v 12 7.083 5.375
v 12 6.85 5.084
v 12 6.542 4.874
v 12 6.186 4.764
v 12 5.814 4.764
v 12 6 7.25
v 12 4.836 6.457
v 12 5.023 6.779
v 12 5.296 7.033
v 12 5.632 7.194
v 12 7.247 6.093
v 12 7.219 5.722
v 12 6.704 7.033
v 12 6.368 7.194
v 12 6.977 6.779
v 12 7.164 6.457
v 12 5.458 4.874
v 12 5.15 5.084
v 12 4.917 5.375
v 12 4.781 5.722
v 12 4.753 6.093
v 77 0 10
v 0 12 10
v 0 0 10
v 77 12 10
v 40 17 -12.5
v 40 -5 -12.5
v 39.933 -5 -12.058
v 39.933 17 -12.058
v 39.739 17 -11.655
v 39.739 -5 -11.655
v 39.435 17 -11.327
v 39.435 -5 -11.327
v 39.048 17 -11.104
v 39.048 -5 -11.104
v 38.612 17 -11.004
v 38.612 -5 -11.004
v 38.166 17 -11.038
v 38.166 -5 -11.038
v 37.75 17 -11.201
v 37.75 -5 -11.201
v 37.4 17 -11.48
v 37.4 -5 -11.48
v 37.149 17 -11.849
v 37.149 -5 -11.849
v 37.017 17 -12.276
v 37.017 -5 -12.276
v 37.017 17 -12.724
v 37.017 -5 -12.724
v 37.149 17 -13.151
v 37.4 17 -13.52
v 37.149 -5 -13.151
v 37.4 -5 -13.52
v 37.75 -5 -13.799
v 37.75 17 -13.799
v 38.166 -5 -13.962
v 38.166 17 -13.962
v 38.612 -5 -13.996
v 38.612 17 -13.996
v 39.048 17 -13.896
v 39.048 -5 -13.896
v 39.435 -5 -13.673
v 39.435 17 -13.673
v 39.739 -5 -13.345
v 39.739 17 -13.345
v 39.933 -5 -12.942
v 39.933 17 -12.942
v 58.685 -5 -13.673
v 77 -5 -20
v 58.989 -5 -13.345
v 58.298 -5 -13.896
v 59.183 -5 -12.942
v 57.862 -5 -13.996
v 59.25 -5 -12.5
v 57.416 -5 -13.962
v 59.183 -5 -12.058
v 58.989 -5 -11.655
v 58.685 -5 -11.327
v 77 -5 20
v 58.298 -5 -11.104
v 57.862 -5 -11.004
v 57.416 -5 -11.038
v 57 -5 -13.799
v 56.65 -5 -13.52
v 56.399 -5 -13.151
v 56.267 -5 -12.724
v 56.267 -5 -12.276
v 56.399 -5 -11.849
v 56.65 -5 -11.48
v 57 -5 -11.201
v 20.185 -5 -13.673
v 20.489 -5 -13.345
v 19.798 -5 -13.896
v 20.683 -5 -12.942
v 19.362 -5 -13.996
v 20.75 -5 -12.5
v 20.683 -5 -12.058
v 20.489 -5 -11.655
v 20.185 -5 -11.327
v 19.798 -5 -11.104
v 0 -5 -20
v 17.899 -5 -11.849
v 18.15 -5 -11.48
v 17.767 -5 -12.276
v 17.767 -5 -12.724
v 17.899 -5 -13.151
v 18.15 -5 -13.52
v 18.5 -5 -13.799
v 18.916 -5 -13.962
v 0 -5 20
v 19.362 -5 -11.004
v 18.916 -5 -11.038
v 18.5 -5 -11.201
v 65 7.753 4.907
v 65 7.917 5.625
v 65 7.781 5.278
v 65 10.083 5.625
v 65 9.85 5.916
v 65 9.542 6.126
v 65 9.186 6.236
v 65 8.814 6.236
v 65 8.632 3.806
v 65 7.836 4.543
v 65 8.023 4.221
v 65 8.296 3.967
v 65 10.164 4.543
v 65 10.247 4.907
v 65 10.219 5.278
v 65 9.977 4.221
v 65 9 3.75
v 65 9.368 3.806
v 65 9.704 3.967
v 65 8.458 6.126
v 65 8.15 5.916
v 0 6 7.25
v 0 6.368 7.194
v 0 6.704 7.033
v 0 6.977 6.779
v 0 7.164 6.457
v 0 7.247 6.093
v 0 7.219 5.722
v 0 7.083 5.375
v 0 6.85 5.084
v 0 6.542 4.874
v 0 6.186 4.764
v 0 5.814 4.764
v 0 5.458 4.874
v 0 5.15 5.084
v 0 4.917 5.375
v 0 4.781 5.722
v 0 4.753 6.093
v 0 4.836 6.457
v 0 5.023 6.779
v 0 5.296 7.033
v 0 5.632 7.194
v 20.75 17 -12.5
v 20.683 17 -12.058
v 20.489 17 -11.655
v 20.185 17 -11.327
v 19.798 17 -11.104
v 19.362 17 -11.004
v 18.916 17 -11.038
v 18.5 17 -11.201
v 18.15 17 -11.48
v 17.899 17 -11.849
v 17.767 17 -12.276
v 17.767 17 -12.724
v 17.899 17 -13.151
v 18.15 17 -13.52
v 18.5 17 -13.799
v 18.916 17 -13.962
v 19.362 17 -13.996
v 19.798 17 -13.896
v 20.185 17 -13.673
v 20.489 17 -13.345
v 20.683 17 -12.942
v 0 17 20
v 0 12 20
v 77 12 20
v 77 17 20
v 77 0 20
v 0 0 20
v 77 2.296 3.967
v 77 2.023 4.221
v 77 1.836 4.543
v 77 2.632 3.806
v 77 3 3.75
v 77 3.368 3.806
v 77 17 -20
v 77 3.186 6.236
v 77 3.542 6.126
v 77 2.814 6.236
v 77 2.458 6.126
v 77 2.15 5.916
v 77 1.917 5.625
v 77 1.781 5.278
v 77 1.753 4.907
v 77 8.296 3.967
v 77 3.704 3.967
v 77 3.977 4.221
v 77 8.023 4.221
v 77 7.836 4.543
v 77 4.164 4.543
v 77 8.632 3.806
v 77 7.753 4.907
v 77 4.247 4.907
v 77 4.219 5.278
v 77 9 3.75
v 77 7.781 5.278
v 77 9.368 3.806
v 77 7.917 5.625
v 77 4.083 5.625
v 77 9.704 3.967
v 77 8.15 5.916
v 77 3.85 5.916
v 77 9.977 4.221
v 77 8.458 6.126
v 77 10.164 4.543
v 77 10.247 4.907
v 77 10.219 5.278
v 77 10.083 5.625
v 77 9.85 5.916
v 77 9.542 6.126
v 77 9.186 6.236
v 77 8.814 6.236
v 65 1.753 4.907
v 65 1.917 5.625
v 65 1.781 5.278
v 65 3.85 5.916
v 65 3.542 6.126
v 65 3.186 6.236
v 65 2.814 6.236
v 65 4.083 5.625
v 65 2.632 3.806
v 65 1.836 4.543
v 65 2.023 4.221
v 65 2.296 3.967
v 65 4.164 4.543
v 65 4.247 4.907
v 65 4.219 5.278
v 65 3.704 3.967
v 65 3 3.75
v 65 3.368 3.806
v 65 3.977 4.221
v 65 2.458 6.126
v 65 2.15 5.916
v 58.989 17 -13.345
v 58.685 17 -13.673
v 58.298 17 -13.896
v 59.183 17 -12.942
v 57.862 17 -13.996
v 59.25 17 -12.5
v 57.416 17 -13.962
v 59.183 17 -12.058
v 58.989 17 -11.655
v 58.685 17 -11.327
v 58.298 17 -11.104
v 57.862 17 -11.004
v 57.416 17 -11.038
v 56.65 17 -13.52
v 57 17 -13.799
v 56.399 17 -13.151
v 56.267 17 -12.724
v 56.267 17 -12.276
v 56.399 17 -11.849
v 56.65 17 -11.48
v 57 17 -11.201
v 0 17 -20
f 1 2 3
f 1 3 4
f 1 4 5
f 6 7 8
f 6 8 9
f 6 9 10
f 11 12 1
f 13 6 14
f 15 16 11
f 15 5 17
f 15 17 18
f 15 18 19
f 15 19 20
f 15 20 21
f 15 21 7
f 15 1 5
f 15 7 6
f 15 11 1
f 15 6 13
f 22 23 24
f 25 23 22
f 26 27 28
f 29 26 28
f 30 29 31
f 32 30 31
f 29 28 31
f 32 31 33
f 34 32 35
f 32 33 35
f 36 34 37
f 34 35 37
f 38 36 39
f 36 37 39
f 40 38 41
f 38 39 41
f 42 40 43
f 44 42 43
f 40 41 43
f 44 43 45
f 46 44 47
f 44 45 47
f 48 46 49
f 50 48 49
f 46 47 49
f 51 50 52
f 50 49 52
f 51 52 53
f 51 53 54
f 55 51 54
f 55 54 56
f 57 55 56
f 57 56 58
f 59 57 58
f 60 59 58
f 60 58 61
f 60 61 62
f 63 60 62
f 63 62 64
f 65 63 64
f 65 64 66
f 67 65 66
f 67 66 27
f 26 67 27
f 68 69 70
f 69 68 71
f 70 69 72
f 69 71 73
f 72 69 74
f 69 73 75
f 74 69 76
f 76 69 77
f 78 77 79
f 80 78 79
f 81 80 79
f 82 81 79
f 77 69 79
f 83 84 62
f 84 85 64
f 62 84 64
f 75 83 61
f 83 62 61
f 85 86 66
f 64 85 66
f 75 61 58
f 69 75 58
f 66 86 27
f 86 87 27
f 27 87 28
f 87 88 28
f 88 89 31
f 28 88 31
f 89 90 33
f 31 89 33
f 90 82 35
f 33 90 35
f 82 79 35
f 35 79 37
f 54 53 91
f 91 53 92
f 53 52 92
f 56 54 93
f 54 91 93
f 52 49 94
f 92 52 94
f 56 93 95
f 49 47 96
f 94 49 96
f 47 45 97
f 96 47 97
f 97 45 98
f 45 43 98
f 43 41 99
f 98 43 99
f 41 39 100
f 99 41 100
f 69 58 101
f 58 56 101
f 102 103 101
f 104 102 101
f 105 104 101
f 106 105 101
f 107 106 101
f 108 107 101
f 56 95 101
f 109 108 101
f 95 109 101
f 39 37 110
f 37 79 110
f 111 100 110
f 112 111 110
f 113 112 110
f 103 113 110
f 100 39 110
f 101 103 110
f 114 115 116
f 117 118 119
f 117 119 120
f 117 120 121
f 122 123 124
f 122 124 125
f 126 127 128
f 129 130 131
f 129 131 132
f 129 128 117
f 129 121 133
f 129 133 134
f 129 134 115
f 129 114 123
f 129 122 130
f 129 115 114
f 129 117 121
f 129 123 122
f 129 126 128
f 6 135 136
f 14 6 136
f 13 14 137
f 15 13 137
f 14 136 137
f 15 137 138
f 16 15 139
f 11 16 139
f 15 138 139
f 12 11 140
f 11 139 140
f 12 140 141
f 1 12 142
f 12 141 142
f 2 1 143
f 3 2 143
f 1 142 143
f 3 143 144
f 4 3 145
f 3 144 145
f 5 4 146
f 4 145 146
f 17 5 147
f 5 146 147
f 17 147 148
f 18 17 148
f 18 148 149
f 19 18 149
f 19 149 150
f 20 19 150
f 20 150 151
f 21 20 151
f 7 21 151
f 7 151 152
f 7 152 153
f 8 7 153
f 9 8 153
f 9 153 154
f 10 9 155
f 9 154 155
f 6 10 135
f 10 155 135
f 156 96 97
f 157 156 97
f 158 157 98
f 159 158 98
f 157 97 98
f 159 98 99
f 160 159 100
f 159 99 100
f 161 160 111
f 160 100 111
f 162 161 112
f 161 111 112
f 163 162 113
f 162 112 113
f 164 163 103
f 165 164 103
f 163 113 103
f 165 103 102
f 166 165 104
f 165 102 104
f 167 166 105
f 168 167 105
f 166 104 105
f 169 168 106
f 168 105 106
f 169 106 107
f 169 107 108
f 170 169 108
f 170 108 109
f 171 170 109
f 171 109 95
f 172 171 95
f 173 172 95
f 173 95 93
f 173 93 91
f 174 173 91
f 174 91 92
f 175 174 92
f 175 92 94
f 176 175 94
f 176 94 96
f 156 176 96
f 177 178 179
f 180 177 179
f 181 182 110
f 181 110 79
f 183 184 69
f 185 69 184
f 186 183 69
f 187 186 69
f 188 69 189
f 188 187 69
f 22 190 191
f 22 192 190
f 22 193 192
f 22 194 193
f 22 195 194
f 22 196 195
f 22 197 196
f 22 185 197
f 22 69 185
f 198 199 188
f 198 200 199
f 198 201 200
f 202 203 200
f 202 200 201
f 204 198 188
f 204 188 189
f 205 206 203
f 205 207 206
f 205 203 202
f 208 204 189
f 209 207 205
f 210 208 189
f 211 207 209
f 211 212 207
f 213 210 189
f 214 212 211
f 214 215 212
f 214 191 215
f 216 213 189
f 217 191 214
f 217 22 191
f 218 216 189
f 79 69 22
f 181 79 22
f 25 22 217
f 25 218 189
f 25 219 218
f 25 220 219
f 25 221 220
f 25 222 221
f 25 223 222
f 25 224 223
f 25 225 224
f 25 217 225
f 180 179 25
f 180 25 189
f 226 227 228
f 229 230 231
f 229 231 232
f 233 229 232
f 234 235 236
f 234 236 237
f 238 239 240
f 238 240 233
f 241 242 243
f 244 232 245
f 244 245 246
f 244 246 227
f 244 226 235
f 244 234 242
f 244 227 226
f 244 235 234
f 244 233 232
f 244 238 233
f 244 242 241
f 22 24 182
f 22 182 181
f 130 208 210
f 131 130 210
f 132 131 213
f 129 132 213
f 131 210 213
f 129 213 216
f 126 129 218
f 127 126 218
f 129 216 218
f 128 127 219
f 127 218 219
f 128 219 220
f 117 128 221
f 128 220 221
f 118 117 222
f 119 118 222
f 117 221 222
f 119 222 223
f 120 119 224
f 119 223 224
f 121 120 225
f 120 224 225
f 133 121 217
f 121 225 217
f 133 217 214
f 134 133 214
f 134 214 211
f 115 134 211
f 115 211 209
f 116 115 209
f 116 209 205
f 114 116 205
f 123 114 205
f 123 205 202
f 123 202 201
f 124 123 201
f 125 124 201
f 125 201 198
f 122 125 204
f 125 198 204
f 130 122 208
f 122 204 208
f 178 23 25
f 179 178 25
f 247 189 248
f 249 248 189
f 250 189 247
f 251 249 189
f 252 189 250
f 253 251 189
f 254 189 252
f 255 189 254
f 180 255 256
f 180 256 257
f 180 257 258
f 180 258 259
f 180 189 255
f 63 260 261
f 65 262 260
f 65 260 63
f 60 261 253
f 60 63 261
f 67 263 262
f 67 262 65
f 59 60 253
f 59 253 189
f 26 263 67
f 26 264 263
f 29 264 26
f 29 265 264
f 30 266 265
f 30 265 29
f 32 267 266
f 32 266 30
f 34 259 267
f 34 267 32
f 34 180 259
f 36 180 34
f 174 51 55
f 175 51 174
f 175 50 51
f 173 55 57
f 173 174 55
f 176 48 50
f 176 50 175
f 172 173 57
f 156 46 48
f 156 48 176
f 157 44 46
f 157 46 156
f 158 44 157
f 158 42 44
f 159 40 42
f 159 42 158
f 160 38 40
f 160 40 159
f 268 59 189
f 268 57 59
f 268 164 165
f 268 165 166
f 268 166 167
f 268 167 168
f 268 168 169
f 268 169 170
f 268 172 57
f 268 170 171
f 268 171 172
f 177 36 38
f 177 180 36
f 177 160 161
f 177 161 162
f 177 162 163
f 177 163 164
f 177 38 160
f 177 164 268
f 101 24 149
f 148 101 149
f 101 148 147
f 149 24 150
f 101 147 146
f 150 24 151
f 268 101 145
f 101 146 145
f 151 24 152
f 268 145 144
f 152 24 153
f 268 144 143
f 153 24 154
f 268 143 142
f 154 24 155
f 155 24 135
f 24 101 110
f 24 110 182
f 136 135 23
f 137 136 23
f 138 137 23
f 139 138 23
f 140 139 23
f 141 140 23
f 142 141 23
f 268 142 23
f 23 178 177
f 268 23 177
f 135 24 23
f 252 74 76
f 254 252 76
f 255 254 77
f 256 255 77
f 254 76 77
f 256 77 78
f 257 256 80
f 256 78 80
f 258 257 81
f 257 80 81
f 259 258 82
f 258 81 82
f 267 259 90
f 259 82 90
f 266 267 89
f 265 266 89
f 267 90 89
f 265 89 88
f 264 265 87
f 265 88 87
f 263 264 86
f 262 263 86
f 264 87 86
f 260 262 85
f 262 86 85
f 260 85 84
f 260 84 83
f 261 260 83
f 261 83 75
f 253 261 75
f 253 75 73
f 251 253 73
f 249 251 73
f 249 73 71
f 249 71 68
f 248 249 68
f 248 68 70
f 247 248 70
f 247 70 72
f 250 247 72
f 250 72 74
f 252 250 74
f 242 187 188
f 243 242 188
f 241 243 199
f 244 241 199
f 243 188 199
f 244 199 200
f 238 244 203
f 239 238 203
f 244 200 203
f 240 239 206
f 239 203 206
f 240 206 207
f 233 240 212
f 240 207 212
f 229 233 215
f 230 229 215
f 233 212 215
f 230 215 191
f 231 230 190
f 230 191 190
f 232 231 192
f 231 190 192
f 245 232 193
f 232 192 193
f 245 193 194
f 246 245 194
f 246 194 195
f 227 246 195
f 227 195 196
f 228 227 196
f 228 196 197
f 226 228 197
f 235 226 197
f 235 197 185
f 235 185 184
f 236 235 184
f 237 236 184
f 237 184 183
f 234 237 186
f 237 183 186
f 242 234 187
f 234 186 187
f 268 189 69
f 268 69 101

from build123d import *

# Parameters (mm, degrees)
SKETCH1_W               = 77
SKETCH1_H               = 12
BOSS_EXTRUDE1_DEPTH     = 10
SKETCH2_R               = 1.25
CUT_EXTRUDE1_DEPTH      = 12
BOSS_EXTRUDE2_OUTLINE_W = 77
BOSS_EXTRUDE2_OUTLINE_H = 20
BOSS_EXTRUDE2_DEPTH     = 5
SKETCH4_W               = 77
SKETCH4_H               = 22
BOSS_EXTRUDE3_DEPTH     = 5
SKETCH5_R               = 1.25
CUT_EXTRUDE2_DEPTH      = 12
SKETCH7_W               = 77
SKETCH7_H               = 22
BOSS_EXTRUDE4_DEPTH     = 15
SKETCH8_R               = 1.5
CUT_EXTRUDE3_DEPTH      = 83.540898953


# Read off the part's stored shape, not the designer's step: Boss-Extrude2
with BuildPart() as part:
    # Sketch1 → Boss-Extrude1 (new body)
    with BuildSketch(Plane.XY):
        with Locations((38.5, 6)):
            Rectangle(SKETCH1_W, SKETCH1_H)
    extrude(amount=BOSS_EXTRUDE1_DEPTH)

    # Sketch2 → Cut-Extrude1 (cut)
    with BuildSketch(Plane(origin=(77, 0, 0), x_dir=(0, 0, -1), z_dir=(1, 0, 0))):
        with Locations((-5, 3)):
            Circle(SKETCH2_R)
        with Locations((-5, 9)):
            Circle(SKETCH2_R)
    extrude(amount=-CUT_EXTRUDE1_DEPTH, mode=Mode.SUBTRACT)

    # Boss-Extrude2 outline → Boss-Extrude2 (add)
    with BuildSketch(Plane(origin=(0, 12, 0), x_dir=(1, 0, 0), z_dir=(0, 1, 0))):
        with Locations((38.5, -10)):
            Rectangle(BOSS_EXTRUDE2_OUTLINE_W, BOSS_EXTRUDE2_OUTLINE_H)
    boss_extrude2 = extrude(amount=BOSS_EXTRUDE2_DEPTH)

    # Mirror2: Boss-Extrude2 across plane
    add(boss_extrude2.mirror(Plane(origin=(0, 6, 0), x_dir=(0, 0, 1), z_dir=(0, -1, 0))))

    # Sketch4 → Boss-Extrude3 (add)
    with BuildSketch(Plane(origin=(0, 0, 0), x_dir=(-1, 0, 0), z_dir=(0, 0, -1))):
        with Locations((-38.5, 6)):
            Rectangle(SKETCH4_W, SKETCH4_H)
    extrude(amount=BOSS_EXTRUDE3_DEPTH)

    # Sketch5 → Cut-Extrude2 (cut)
    with BuildSketch(Plane.ZY):
        with Locations((6, 6)):
            Circle(SKETCH5_R)
    extrude(amount=-CUT_EXTRUDE2_DEPTH, mode=Mode.SUBTRACT)

    # Sketch7 → Boss-Extrude4 (add)
    with BuildSketch(Plane(origin=(0, 0, -5), x_dir=(-1, 0, 0), z_dir=(0, 0, -1))):
        with Locations((-38.5, 6)):
            Rectangle(SKETCH7_W, SKETCH7_H)
    extrude(amount=BOSS_EXTRUDE4_DEPTH)

    # Sketch8 → Cut-Extrude3 (cut, through all)
    with BuildSketch(Plane.XZ.offset(5)):
        with Locations((19.25, -12.5)):
            Circle(SKETCH8_R)
        with Locations((38.5, -12.5)):
            Circle(SKETCH8_R)
        with Locations((57.75, -12.5)):
            Circle(SKETCH8_R)
    extrude(amount=-CUT_EXTRUDE3_DEPTH, mode=Mode.SUBTRACT)


solid = part.part
